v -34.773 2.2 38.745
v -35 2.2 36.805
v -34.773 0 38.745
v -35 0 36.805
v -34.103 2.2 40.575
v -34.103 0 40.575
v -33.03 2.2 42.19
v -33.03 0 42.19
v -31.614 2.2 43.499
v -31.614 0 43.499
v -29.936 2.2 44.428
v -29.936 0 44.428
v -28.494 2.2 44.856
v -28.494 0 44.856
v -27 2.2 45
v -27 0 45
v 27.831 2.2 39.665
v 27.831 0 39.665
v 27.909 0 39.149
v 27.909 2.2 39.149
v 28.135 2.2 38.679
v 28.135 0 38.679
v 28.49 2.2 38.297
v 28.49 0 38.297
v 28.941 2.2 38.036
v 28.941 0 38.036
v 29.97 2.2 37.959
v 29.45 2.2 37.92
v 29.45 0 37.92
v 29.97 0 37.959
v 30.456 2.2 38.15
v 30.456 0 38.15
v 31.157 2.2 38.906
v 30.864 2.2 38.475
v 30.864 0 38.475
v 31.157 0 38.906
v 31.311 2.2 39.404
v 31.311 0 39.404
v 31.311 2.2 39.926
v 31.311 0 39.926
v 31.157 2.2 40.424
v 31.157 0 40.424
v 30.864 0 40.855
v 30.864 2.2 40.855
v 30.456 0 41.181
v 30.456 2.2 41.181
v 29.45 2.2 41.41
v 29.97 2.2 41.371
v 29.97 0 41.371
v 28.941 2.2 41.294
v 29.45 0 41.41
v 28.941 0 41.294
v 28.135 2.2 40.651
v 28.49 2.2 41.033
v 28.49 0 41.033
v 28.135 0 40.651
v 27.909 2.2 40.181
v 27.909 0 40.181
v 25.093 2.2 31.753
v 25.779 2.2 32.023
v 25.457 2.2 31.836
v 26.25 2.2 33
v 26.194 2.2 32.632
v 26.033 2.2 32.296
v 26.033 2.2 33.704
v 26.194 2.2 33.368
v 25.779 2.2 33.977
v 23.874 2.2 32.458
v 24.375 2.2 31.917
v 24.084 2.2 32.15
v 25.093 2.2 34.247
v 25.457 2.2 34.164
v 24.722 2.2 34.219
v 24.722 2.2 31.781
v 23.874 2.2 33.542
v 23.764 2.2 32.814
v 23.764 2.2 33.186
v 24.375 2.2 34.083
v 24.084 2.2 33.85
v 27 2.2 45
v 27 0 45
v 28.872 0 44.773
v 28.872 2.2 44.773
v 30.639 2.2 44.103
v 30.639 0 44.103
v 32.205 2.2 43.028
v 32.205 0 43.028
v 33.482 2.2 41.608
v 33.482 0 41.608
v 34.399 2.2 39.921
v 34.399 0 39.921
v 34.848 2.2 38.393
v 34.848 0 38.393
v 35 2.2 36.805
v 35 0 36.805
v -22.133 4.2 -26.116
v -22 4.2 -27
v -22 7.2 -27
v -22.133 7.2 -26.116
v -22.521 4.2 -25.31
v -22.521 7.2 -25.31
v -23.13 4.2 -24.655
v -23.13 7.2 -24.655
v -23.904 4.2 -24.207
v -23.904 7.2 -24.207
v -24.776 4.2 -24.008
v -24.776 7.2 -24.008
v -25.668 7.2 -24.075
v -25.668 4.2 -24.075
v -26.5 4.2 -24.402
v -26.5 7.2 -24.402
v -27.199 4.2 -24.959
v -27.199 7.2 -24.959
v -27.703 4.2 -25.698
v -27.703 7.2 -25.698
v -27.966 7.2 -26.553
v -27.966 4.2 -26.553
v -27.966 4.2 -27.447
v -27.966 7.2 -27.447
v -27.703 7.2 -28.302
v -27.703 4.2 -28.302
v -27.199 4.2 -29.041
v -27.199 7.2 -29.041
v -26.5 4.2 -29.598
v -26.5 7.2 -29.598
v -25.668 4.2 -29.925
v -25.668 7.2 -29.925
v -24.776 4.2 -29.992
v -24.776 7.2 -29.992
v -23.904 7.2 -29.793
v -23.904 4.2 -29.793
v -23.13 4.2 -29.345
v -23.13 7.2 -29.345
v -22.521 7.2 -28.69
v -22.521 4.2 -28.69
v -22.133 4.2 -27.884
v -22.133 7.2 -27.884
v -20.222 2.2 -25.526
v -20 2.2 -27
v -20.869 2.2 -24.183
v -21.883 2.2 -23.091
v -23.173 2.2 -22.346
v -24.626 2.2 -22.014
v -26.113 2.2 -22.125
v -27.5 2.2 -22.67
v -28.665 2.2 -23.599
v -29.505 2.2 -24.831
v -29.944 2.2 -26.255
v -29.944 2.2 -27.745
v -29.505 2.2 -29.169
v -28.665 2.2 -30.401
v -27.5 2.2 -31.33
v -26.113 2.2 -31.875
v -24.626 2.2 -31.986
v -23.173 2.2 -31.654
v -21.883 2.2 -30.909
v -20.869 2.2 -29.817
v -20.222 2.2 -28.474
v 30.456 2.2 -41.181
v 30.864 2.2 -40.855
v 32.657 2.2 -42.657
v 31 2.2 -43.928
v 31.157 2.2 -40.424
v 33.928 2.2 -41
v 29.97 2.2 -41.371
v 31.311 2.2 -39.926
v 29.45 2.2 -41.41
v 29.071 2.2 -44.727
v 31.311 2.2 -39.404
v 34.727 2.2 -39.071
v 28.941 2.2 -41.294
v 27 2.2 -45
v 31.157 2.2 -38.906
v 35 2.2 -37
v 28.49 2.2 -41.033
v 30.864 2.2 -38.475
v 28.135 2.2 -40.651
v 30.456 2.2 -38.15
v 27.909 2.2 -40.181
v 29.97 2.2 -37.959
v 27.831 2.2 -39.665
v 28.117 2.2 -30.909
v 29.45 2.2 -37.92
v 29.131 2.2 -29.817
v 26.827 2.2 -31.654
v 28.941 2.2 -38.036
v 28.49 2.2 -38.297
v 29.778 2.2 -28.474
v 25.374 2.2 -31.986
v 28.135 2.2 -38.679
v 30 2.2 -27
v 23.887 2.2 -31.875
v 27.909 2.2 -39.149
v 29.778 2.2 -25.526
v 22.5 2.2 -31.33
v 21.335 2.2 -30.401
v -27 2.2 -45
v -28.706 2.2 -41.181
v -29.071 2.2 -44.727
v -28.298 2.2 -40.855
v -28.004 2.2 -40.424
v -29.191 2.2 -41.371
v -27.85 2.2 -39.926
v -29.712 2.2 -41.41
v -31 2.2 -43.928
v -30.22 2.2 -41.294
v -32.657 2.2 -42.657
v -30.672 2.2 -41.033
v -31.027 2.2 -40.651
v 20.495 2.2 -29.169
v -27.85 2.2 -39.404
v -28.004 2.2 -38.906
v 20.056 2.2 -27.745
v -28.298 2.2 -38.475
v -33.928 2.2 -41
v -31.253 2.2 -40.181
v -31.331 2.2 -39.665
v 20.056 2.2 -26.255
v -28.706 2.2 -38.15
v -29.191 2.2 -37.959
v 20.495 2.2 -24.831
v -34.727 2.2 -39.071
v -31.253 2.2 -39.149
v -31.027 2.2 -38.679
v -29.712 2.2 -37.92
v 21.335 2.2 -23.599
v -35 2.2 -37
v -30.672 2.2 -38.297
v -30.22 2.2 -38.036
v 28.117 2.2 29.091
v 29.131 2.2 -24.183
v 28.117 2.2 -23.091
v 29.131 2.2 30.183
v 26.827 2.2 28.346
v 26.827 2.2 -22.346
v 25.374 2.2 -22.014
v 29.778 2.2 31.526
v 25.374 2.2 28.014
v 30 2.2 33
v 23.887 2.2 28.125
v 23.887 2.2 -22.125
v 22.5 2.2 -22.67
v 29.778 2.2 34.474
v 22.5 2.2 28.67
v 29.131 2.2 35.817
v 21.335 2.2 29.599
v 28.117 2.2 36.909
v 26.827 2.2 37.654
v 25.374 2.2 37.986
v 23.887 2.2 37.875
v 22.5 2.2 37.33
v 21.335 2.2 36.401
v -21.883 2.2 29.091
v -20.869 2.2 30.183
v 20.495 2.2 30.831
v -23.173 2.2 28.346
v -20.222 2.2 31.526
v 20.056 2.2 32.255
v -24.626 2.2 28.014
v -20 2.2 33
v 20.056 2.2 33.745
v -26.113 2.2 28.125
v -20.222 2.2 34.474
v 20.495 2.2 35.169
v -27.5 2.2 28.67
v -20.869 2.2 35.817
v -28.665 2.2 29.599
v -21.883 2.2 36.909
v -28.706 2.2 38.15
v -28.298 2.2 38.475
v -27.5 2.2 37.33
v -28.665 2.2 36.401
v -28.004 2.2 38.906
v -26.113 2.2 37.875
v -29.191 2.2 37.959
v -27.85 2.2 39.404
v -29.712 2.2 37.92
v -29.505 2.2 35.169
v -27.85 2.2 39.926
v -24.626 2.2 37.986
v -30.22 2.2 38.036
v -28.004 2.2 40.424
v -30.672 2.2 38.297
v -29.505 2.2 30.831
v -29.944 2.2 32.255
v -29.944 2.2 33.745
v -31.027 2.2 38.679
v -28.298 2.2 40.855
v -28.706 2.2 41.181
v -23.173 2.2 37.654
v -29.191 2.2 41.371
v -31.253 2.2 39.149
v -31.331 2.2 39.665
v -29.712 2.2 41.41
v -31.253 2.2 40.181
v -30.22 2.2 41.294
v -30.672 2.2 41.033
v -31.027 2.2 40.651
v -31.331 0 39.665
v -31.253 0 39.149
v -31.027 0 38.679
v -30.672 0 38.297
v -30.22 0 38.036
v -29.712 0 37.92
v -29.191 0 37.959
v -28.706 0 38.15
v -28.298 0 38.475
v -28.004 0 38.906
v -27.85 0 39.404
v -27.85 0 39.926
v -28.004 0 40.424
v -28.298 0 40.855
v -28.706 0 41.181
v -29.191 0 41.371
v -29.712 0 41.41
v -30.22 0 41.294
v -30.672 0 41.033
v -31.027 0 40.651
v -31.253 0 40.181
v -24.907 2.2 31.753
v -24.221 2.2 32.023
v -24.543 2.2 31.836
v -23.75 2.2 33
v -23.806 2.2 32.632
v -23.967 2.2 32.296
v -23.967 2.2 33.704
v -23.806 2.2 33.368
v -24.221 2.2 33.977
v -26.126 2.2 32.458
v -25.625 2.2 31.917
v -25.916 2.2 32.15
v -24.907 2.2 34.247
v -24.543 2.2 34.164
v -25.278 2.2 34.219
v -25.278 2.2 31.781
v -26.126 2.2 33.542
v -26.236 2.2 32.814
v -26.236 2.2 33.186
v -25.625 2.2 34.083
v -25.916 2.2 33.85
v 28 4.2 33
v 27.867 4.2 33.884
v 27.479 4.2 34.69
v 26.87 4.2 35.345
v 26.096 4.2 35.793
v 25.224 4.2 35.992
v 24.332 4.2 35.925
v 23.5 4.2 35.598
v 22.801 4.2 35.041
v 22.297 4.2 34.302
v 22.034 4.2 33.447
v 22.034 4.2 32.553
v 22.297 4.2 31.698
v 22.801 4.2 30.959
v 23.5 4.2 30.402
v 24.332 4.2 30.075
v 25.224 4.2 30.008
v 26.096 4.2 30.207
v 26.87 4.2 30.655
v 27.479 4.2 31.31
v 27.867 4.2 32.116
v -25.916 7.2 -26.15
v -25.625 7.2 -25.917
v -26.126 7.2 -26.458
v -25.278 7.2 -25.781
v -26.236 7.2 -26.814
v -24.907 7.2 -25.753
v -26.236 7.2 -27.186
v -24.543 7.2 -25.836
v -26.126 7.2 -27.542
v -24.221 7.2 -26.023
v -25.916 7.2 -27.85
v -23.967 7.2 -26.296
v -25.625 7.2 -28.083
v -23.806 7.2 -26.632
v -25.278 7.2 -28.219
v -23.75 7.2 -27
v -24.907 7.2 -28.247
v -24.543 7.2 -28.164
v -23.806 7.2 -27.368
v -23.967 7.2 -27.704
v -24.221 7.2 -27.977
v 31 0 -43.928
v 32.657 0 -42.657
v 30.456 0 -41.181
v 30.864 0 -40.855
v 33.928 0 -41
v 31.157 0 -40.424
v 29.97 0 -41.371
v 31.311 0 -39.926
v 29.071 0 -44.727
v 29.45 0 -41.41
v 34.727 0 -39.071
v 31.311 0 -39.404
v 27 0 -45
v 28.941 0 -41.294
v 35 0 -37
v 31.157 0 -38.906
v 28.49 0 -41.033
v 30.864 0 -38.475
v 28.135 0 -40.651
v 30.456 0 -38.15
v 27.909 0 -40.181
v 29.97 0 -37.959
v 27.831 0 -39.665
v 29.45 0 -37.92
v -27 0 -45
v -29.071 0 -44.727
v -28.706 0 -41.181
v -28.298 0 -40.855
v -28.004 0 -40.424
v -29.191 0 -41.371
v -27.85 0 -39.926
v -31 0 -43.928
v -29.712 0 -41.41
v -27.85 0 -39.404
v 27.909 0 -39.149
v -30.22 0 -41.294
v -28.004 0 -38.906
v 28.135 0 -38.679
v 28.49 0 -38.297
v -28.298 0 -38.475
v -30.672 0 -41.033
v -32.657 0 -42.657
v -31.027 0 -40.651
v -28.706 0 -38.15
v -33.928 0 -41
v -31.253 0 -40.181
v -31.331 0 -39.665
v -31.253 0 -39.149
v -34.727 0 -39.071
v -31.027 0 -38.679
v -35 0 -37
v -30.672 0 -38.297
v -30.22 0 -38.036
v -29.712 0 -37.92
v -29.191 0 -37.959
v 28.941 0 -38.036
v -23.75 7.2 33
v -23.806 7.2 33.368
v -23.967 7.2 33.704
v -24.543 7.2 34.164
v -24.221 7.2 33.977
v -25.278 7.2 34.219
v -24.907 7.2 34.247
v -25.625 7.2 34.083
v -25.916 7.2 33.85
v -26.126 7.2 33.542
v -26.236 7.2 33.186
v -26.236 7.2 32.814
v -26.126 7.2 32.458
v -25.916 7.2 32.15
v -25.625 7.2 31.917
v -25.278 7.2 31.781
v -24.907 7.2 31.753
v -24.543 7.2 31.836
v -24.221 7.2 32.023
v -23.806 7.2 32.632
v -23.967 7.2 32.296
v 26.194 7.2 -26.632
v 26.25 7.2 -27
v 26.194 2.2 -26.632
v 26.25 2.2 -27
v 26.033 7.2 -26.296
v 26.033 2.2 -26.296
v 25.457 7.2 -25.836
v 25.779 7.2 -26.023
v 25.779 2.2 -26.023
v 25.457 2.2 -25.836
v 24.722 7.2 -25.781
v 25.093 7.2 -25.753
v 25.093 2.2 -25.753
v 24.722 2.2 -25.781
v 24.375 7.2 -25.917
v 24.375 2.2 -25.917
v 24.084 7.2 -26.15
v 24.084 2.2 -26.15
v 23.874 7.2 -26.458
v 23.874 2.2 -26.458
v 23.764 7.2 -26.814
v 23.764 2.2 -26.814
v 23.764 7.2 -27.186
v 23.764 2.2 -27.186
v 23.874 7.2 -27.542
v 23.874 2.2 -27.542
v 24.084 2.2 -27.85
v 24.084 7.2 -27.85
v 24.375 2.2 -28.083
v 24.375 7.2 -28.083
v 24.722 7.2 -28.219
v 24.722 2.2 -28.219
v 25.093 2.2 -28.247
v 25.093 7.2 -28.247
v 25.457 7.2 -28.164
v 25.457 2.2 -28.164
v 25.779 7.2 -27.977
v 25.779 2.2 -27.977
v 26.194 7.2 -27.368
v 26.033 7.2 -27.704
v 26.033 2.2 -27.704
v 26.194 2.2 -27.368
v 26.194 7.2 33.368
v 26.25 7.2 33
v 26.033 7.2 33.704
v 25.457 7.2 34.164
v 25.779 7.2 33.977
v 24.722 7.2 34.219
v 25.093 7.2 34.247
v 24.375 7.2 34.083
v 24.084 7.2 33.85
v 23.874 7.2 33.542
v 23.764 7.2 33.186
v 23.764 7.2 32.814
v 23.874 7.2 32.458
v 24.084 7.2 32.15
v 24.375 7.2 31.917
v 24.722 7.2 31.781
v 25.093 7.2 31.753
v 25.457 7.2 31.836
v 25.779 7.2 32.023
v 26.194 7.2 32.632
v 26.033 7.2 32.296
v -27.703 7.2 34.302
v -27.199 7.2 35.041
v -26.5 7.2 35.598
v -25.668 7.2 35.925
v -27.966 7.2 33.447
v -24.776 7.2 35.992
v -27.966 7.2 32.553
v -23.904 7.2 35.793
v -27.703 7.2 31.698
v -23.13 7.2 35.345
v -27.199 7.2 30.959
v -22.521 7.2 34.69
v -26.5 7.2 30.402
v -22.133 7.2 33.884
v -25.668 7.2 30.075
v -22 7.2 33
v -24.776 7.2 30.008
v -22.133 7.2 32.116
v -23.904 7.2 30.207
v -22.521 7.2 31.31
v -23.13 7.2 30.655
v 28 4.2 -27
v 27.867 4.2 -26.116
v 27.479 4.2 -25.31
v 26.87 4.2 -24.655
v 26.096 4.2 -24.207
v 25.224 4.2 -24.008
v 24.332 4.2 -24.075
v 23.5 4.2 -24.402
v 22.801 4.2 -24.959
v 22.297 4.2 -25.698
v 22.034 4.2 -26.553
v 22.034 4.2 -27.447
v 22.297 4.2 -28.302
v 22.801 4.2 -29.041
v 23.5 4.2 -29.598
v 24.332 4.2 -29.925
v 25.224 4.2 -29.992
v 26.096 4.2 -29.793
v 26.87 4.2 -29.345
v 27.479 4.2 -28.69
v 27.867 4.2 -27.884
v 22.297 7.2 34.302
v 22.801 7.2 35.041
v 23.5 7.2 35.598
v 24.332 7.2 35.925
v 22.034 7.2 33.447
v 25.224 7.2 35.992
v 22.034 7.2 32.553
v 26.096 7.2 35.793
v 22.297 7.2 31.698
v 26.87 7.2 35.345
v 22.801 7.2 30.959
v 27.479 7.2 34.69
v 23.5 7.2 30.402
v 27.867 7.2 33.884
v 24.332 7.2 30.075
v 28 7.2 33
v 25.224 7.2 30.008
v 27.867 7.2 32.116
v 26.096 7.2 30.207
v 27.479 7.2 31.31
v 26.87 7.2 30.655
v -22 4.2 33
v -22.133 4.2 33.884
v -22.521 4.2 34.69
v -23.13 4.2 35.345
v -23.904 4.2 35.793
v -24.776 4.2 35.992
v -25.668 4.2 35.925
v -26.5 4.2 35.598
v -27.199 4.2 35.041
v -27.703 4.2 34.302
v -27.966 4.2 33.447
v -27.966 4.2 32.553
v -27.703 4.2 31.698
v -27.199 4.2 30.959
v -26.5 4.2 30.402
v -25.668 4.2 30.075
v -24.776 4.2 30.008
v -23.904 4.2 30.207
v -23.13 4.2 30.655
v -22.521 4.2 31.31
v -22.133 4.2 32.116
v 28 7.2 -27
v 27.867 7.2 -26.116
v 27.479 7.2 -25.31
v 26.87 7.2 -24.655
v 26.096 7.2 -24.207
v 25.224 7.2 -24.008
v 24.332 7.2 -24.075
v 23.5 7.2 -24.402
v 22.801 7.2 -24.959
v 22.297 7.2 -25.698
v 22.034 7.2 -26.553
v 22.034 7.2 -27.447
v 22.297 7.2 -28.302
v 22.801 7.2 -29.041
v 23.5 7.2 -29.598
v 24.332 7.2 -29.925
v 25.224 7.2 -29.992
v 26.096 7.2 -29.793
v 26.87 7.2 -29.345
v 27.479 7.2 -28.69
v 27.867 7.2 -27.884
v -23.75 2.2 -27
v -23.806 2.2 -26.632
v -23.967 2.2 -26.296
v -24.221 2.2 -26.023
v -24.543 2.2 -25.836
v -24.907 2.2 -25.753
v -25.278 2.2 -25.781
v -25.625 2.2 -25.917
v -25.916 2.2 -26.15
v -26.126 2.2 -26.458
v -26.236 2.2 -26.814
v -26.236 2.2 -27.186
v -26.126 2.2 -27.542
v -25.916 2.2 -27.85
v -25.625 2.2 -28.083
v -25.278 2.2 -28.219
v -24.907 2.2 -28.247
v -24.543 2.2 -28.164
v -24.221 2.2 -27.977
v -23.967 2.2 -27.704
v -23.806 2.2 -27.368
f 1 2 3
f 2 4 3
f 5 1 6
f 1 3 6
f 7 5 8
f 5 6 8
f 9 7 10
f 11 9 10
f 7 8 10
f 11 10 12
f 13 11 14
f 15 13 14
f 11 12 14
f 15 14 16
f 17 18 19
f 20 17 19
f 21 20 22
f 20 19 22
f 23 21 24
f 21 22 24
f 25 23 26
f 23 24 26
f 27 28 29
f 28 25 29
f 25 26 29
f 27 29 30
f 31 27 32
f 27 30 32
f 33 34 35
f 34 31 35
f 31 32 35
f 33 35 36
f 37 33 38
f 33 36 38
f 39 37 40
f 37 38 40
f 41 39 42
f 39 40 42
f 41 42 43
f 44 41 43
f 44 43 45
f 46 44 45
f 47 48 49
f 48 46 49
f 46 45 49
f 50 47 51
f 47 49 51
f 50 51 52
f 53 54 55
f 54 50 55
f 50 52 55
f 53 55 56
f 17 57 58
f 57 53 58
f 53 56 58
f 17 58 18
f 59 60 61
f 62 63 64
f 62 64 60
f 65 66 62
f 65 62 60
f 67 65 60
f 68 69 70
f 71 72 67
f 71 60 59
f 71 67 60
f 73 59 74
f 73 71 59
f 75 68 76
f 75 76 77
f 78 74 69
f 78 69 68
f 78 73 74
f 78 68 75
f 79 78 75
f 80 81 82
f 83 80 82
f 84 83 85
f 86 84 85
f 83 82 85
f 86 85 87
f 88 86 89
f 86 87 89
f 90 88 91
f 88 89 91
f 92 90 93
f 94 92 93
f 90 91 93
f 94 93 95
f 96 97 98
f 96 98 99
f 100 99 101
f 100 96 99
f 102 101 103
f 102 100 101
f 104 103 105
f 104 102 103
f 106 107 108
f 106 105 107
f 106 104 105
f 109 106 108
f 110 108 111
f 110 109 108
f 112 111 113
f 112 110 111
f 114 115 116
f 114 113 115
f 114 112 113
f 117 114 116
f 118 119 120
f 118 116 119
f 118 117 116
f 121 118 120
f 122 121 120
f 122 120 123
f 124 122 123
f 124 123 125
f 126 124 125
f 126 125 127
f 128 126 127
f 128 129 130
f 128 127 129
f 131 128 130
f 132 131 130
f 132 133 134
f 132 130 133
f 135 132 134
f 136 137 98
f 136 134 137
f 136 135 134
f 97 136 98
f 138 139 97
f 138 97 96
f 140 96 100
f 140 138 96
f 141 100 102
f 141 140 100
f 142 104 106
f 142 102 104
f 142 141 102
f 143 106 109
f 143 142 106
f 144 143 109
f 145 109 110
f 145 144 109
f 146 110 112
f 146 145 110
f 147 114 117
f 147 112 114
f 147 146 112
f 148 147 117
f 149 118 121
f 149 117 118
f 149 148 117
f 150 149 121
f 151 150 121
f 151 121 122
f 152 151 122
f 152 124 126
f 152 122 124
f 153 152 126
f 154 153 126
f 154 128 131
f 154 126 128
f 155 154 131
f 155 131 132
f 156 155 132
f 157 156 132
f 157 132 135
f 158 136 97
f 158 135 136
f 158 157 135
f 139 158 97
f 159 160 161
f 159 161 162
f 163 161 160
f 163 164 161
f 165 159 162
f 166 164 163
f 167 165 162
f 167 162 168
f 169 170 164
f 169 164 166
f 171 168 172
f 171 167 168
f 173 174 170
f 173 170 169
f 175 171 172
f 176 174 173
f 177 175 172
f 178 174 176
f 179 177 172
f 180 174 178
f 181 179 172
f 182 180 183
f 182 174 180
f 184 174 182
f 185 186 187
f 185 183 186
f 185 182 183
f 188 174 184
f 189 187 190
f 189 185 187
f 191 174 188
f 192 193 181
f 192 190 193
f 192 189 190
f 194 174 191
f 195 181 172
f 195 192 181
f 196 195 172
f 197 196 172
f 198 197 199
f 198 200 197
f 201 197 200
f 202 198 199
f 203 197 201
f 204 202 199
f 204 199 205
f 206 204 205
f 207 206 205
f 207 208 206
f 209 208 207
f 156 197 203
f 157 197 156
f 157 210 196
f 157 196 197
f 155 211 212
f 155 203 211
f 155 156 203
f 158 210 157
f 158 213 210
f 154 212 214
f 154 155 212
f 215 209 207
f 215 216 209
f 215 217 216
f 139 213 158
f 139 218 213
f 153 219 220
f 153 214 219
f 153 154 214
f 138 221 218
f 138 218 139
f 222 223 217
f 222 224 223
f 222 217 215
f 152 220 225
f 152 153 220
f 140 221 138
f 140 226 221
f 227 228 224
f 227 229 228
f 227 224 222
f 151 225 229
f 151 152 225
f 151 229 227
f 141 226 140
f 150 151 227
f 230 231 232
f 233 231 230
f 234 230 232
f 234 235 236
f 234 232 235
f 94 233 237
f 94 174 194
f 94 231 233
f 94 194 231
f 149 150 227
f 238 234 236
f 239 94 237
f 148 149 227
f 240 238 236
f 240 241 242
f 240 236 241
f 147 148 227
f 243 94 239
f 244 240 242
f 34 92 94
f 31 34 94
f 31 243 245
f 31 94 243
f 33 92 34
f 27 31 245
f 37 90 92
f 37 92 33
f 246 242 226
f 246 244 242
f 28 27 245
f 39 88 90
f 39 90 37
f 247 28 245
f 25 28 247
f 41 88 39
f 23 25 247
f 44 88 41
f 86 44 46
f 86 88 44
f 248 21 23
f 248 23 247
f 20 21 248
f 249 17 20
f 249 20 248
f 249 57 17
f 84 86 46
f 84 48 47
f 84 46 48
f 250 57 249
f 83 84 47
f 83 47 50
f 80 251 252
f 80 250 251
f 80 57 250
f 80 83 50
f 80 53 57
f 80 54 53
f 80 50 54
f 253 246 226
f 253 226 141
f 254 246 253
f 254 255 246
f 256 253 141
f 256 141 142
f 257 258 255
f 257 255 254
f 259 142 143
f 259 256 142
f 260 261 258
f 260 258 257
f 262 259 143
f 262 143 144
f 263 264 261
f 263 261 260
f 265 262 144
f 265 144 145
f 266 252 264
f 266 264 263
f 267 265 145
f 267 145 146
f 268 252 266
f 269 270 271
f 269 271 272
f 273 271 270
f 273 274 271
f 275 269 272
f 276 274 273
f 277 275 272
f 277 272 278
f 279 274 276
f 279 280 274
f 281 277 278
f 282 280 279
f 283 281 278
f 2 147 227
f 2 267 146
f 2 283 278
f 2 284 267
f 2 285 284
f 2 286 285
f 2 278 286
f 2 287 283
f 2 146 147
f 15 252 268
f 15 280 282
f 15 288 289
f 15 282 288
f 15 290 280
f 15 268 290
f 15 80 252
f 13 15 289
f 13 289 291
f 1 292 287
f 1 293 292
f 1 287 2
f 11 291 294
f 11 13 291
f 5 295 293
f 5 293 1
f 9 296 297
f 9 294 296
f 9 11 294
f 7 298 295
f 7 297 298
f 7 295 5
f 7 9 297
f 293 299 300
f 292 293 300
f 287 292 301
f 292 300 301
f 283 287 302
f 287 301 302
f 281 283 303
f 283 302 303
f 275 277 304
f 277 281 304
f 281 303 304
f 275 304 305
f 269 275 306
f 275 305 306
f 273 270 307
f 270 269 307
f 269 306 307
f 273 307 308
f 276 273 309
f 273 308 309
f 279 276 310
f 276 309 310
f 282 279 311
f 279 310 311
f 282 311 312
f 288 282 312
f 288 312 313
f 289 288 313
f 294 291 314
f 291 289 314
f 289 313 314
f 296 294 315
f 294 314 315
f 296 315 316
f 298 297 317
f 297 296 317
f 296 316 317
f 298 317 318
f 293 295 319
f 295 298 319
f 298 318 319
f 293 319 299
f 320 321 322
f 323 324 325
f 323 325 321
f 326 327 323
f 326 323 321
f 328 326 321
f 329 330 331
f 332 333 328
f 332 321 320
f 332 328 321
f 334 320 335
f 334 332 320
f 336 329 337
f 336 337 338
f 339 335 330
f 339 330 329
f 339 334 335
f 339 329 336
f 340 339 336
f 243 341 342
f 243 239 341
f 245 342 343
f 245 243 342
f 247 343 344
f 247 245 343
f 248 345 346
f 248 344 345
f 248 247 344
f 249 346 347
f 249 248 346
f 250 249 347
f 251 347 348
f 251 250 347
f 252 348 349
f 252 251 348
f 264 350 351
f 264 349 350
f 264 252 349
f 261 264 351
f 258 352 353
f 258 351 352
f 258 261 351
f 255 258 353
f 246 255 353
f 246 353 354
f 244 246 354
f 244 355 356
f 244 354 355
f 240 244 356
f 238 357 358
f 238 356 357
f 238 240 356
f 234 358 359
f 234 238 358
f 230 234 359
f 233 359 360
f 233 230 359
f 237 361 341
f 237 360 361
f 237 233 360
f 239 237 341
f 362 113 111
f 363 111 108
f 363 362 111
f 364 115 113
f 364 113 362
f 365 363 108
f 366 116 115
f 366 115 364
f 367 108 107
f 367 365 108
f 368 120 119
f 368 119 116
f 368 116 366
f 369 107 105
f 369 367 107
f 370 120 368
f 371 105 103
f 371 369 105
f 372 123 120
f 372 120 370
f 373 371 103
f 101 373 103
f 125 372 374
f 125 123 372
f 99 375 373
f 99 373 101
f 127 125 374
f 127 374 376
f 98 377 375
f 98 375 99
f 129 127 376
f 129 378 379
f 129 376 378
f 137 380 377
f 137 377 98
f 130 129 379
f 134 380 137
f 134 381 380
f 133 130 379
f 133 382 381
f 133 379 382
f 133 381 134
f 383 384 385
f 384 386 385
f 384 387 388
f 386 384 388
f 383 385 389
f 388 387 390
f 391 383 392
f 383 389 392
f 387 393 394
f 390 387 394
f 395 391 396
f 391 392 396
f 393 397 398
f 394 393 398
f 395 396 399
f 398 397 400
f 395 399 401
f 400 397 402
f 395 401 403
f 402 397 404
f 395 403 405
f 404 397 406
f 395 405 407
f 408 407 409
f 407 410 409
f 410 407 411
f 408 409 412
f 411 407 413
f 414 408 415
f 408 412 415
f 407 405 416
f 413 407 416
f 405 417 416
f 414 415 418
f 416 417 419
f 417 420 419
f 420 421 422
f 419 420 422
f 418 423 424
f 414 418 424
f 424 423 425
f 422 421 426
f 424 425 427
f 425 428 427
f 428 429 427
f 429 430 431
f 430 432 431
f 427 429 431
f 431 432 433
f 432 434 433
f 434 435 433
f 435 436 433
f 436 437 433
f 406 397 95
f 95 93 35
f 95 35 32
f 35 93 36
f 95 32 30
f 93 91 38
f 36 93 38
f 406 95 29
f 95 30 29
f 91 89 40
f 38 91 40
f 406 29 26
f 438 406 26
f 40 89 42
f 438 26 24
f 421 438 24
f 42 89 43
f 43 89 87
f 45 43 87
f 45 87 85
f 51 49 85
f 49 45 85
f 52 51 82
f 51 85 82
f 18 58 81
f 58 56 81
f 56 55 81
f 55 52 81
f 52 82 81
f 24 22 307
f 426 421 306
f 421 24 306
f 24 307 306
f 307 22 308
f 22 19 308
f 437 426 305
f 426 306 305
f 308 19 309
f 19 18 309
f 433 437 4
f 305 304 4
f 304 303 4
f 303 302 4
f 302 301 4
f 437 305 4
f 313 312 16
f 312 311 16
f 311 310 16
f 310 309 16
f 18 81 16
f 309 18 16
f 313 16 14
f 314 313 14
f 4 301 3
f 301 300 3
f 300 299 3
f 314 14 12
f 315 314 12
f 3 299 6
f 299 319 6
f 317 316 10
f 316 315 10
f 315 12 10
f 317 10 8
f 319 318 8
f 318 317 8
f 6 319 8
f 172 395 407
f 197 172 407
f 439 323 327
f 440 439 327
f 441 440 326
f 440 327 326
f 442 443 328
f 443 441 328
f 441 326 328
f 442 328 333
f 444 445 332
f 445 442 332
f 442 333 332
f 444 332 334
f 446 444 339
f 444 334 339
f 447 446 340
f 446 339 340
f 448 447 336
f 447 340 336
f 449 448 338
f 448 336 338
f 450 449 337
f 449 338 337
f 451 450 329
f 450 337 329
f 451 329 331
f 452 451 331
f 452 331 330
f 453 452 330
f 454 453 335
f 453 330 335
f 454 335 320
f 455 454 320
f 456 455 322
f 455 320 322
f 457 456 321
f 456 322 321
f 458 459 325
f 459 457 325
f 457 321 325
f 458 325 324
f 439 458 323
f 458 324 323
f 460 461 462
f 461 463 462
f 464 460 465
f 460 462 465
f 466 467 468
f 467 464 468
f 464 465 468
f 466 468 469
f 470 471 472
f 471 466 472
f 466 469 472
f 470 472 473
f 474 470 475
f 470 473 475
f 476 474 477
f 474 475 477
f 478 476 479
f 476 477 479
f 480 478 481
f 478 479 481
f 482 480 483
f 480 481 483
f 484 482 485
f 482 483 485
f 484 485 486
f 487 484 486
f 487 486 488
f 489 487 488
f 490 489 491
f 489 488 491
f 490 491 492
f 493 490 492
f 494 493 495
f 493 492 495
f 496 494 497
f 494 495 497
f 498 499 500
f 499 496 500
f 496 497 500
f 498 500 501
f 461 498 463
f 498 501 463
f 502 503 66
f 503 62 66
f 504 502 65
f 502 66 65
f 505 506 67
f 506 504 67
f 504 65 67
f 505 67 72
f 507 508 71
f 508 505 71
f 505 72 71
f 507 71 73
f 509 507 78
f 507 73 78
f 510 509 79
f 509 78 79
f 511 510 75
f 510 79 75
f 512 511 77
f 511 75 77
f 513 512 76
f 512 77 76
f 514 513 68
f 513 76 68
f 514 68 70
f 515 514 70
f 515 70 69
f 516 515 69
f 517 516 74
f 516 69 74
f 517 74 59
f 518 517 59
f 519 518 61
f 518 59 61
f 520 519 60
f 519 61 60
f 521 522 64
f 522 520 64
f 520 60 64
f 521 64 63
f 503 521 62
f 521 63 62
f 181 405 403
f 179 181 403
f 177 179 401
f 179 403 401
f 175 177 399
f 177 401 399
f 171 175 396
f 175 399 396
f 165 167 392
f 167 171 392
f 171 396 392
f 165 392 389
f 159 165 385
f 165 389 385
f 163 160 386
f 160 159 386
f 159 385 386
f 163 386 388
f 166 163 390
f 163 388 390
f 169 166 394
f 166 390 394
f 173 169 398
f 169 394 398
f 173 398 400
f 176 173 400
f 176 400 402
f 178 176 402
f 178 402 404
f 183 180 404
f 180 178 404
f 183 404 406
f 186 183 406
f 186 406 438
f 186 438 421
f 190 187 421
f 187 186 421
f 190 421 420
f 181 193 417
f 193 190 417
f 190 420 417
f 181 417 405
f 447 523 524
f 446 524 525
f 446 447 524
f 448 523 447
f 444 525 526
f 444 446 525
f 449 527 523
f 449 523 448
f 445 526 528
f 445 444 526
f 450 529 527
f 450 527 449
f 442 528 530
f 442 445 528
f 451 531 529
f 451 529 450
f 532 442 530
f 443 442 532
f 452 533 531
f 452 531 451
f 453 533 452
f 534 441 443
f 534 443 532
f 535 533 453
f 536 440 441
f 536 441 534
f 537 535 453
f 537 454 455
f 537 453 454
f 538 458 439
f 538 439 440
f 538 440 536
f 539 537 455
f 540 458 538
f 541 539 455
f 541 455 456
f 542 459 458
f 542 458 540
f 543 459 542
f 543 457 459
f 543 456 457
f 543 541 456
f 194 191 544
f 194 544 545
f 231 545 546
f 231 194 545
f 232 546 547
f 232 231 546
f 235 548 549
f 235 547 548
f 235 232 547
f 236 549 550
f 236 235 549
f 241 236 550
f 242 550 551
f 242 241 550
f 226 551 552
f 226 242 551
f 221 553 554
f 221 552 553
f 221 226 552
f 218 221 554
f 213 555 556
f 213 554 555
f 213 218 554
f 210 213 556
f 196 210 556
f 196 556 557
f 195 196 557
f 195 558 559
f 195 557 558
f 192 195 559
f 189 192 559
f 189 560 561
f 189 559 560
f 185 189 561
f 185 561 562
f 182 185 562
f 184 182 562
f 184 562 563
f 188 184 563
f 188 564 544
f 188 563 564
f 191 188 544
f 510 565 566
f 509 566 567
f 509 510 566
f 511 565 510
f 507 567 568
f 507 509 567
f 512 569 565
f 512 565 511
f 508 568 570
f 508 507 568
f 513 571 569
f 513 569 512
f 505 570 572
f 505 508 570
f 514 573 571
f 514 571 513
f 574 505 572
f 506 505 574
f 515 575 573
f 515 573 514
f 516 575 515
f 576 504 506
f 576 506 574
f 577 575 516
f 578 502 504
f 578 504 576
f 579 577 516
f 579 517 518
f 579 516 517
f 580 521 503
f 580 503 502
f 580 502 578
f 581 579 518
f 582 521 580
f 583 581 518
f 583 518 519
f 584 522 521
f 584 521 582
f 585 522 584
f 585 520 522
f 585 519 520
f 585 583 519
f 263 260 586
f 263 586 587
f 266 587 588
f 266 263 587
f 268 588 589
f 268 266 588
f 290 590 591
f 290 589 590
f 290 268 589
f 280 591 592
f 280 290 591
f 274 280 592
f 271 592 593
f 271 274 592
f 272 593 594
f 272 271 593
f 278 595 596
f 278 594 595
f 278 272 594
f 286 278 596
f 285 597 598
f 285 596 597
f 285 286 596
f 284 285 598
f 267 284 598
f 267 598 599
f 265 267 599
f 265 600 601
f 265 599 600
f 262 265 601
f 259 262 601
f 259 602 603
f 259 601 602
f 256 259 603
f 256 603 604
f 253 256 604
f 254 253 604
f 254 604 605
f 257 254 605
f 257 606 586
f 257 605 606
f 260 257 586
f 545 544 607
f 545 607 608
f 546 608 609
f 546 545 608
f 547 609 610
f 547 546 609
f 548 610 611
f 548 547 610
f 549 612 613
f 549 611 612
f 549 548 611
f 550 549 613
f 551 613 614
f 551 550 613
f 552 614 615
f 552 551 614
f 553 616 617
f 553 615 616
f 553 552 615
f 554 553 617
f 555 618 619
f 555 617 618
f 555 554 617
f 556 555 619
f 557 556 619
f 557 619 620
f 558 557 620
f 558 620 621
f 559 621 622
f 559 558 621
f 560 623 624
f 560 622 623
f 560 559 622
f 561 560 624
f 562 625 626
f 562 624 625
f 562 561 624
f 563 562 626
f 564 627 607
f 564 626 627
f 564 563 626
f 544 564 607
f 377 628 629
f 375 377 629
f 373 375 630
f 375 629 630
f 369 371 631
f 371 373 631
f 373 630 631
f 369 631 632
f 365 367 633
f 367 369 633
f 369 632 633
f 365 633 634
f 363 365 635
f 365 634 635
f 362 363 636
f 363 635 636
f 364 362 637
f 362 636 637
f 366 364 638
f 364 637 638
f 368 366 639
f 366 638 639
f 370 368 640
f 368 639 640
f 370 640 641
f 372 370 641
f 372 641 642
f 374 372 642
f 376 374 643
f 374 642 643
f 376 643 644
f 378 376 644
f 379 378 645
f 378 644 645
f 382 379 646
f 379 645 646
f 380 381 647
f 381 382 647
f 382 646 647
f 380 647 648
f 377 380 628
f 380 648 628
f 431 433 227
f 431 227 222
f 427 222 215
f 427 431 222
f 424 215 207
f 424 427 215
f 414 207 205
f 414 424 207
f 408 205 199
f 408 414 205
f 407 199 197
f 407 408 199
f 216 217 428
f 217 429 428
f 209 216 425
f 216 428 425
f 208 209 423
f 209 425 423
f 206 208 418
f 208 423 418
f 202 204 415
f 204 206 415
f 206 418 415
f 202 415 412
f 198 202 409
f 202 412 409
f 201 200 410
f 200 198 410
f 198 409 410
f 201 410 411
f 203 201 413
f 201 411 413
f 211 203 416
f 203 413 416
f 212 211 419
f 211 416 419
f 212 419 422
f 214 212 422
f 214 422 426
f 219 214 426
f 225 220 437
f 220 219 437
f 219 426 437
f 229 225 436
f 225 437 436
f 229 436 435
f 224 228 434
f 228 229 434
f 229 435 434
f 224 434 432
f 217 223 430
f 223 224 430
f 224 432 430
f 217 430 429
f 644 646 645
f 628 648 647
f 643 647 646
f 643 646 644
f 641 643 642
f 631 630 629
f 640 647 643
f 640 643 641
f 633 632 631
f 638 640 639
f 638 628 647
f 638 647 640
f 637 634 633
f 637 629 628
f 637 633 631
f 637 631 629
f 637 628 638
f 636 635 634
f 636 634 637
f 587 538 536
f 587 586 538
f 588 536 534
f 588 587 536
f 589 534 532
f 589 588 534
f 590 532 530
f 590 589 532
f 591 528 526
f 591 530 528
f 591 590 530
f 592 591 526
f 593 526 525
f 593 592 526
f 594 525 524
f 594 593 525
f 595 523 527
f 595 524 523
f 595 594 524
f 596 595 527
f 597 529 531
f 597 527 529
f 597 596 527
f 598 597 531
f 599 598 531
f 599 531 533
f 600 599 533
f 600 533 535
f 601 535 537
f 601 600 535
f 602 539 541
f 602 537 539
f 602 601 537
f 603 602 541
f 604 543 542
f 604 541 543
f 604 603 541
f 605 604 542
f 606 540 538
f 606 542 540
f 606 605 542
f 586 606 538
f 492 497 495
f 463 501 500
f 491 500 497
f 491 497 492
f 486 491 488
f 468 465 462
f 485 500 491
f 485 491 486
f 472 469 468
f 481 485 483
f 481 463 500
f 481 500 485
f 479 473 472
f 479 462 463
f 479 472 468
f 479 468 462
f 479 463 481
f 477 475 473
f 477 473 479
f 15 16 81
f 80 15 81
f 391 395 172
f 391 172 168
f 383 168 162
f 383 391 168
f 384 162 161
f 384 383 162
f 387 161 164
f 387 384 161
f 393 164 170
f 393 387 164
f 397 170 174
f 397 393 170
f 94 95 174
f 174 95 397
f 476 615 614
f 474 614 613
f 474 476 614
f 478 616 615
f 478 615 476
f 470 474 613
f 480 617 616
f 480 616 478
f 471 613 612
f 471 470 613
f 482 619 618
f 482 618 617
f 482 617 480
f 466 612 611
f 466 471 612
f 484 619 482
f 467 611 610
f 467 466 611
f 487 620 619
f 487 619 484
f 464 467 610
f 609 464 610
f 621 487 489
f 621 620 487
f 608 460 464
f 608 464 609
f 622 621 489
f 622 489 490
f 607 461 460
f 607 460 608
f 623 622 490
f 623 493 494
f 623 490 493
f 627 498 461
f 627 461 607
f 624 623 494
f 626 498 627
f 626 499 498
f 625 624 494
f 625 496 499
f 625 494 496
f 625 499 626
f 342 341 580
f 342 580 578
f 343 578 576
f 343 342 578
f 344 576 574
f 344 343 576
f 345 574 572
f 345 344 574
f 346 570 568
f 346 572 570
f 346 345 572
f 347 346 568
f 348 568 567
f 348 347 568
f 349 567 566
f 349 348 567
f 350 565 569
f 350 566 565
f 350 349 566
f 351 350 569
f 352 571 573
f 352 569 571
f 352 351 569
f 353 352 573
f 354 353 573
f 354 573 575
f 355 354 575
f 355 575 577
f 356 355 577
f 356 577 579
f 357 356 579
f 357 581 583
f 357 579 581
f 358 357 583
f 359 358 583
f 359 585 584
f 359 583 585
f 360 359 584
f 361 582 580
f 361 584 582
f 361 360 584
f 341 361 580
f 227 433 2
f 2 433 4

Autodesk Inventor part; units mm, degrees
ref_plane "YZ Plane" through (0, 0, 0) normal (1, 0, 0) x (0, 1, 0)
ref_plane "XZ Plane" through (0, 0, 0) normal (0, 1, 0) x (-1, 0, 0)
ref_plane "XY Plane" through (0, 0, 0) normal (0, 0, 1) x (1, 0, 0)
sketch "Sketch1" plane through (0, 0, 0) normal (0, 1, 0) x (-1, 0, 0)
  circle A0 centre (29.5808, -39.6651) radius 1.75
  circle A1 centre (-29.5808, 39.6651) radius 1.75
  circle A2 centre (29.5808, 39.6651) radius 1.75
  circle A3 centre (-29.5808, -39.6651) radius 1.75
  line L0 (-27, -45) -> (27, -45)
  arc A4 (27, -45) -> (35, -37) centre (27, -37) ccw
  line L1 (35, -37) -> (35, 36.8048)
  ellipse E0 centre (27, 36.8048) end of major axis (27, 45) minor radius 8 (35, 36.8048) -> (27, 45) ccw
  line L2 (27, 45) -> (-27, 45)
  ellipse E1 centre (-27, 36.8048) end of major axis (-27, 45) minor radius 8 (-27, 45) -> (-35, 36.8048) ccw
  line L3 (-35, 36.8048) -> (-35, -37)
  arc A5 (-35, -37) -> (-27, -45) centre (-27, -37) ccw
  line L4 (22.5, -42.5) -> (-22.5, -42.5)
  arc A6 (-24.2843, -42.3395) -> (-22.5, -42.5) centre (-22.5, -32.5) ccw
  arc A7 (-24.2843, -42.3395) -> (-32.4877, -32.9952) centre (-33.2764, -41.9606) ccw
  arc A8 (-32.5, -32.5) -> (-32.4877, -32.9952) centre (-22.5, -32.5) ccw
  line L5 (-32.5, -32.5) -> (-32.5, 32.2561)
  ellipse E2 centre (-22.5, 32.2561) end of major axis (-22.5, 42.5) minor radius 10 (-32.4132, 33.603) -> (-32.5, 32.2561) ccw
  arc A9 (-32.4132, 33.603) -> (-23.6584, 42.431) centre (-32.6569, 42.5997) ccw
  ellipse E3 centre (-22.5, 32.2561) end of major axis (-22.5, 42.5) minor radius 10 (-22.5, 42.5) -> (-23.6584, 42.431) ccw
  line L6 (-22.5, 42.5) -> (22.5, 42.5)
  ellipse E4 centre (22.5, 32.2561) end of major axis (22.5, 42.5) minor radius 10 (23.6584, 42.431) -> (22.5, 42.5) ccw
  arc A10 (23.6584, 42.431) -> (32.4132, 33.603) centre (32.6569, 42.5997) ccw
  ellipse E5 centre (22.5, 32.2561) end of major axis (22.5, 42.5) minor radius 10 (32.5, 32.2561) -> (32.4132, 33.603) ccw
  line L7 (32.5, 32.2561) -> (32.5, -32.5)
  arc A11 (32.4877, -32.9952) -> (32.5, -32.5) centre (22.5, -32.5) ccw
  arc A12 (32.4877, -32.9952) -> (24.2843, -42.3395) centre (33.2764, -41.9606) ccw
  arc A13 (22.5, -42.5) -> (24.2843, -42.3395) centre (22.5, -32.5) ccw
  line L8 (-19.7694, -45) -> (13.1764, -45)
  point P0 (0, 0)
  point P1 (0, 0)
extrude "Extrusion1" add sketch "Sketch1" along normal blind 2.2 contours A5 L3 E1 L2 E0 L1 A4 L0 | L4 A6 A7 A8 L5 E2 A9 E3 L6 E4 A10 E5 L7 A11 A12 A13
sketch "Sketch2" plane through (0, 2.2, 0) normal (0, 1, 0) x (1, 0, 0)
  line L0 (27, 45) -> (-27, 45) projected
  circle A0 centre (-25, 27) radius 1.25
  circle A1 centre (-25, 27) radius 3
  circle A2 centre (25, 27) radius 3
  circle A3 centre (25, 27) radius 1.25
  circle A4 centre (25, -33) radius 3
  circle A5 centre (25, -33) radius 1.25
  circle A6 centre (-25, -33) radius 3
  circle A7 centre (-25, -33) radius 1.25
  line L1 (-27, -45) -> (27, -45) projected
  point P0 (0, 0)
  point P1 (0, 0)
  point P2 (0, -5)
  dimension "d5" = 2.5
  dimension "d6" = 6
  dimension "d7" = 2.5
  dimension "d8" = 6
  dimension "d9" = 2.5
  dimension "d10" = 6
  dimension "d11" = 2.5
  dimension "d12" = 6
  dimension "d21" = 12
  dimension "d22" = 12
  dimension "d23" = 18
  dimension "d24" = 18
extrude "Extrusion2" add sketch "Sketch2" along normal blind 5
chamfer "Chamfer1" distance 2 angle 45 4 edges at (-28, 2.2, 33) (22, 2.2, 33) (-28, 2.2, -27) (22, 2.2, -27)
properties part number "obudowa - budzik v4 dol dol"
